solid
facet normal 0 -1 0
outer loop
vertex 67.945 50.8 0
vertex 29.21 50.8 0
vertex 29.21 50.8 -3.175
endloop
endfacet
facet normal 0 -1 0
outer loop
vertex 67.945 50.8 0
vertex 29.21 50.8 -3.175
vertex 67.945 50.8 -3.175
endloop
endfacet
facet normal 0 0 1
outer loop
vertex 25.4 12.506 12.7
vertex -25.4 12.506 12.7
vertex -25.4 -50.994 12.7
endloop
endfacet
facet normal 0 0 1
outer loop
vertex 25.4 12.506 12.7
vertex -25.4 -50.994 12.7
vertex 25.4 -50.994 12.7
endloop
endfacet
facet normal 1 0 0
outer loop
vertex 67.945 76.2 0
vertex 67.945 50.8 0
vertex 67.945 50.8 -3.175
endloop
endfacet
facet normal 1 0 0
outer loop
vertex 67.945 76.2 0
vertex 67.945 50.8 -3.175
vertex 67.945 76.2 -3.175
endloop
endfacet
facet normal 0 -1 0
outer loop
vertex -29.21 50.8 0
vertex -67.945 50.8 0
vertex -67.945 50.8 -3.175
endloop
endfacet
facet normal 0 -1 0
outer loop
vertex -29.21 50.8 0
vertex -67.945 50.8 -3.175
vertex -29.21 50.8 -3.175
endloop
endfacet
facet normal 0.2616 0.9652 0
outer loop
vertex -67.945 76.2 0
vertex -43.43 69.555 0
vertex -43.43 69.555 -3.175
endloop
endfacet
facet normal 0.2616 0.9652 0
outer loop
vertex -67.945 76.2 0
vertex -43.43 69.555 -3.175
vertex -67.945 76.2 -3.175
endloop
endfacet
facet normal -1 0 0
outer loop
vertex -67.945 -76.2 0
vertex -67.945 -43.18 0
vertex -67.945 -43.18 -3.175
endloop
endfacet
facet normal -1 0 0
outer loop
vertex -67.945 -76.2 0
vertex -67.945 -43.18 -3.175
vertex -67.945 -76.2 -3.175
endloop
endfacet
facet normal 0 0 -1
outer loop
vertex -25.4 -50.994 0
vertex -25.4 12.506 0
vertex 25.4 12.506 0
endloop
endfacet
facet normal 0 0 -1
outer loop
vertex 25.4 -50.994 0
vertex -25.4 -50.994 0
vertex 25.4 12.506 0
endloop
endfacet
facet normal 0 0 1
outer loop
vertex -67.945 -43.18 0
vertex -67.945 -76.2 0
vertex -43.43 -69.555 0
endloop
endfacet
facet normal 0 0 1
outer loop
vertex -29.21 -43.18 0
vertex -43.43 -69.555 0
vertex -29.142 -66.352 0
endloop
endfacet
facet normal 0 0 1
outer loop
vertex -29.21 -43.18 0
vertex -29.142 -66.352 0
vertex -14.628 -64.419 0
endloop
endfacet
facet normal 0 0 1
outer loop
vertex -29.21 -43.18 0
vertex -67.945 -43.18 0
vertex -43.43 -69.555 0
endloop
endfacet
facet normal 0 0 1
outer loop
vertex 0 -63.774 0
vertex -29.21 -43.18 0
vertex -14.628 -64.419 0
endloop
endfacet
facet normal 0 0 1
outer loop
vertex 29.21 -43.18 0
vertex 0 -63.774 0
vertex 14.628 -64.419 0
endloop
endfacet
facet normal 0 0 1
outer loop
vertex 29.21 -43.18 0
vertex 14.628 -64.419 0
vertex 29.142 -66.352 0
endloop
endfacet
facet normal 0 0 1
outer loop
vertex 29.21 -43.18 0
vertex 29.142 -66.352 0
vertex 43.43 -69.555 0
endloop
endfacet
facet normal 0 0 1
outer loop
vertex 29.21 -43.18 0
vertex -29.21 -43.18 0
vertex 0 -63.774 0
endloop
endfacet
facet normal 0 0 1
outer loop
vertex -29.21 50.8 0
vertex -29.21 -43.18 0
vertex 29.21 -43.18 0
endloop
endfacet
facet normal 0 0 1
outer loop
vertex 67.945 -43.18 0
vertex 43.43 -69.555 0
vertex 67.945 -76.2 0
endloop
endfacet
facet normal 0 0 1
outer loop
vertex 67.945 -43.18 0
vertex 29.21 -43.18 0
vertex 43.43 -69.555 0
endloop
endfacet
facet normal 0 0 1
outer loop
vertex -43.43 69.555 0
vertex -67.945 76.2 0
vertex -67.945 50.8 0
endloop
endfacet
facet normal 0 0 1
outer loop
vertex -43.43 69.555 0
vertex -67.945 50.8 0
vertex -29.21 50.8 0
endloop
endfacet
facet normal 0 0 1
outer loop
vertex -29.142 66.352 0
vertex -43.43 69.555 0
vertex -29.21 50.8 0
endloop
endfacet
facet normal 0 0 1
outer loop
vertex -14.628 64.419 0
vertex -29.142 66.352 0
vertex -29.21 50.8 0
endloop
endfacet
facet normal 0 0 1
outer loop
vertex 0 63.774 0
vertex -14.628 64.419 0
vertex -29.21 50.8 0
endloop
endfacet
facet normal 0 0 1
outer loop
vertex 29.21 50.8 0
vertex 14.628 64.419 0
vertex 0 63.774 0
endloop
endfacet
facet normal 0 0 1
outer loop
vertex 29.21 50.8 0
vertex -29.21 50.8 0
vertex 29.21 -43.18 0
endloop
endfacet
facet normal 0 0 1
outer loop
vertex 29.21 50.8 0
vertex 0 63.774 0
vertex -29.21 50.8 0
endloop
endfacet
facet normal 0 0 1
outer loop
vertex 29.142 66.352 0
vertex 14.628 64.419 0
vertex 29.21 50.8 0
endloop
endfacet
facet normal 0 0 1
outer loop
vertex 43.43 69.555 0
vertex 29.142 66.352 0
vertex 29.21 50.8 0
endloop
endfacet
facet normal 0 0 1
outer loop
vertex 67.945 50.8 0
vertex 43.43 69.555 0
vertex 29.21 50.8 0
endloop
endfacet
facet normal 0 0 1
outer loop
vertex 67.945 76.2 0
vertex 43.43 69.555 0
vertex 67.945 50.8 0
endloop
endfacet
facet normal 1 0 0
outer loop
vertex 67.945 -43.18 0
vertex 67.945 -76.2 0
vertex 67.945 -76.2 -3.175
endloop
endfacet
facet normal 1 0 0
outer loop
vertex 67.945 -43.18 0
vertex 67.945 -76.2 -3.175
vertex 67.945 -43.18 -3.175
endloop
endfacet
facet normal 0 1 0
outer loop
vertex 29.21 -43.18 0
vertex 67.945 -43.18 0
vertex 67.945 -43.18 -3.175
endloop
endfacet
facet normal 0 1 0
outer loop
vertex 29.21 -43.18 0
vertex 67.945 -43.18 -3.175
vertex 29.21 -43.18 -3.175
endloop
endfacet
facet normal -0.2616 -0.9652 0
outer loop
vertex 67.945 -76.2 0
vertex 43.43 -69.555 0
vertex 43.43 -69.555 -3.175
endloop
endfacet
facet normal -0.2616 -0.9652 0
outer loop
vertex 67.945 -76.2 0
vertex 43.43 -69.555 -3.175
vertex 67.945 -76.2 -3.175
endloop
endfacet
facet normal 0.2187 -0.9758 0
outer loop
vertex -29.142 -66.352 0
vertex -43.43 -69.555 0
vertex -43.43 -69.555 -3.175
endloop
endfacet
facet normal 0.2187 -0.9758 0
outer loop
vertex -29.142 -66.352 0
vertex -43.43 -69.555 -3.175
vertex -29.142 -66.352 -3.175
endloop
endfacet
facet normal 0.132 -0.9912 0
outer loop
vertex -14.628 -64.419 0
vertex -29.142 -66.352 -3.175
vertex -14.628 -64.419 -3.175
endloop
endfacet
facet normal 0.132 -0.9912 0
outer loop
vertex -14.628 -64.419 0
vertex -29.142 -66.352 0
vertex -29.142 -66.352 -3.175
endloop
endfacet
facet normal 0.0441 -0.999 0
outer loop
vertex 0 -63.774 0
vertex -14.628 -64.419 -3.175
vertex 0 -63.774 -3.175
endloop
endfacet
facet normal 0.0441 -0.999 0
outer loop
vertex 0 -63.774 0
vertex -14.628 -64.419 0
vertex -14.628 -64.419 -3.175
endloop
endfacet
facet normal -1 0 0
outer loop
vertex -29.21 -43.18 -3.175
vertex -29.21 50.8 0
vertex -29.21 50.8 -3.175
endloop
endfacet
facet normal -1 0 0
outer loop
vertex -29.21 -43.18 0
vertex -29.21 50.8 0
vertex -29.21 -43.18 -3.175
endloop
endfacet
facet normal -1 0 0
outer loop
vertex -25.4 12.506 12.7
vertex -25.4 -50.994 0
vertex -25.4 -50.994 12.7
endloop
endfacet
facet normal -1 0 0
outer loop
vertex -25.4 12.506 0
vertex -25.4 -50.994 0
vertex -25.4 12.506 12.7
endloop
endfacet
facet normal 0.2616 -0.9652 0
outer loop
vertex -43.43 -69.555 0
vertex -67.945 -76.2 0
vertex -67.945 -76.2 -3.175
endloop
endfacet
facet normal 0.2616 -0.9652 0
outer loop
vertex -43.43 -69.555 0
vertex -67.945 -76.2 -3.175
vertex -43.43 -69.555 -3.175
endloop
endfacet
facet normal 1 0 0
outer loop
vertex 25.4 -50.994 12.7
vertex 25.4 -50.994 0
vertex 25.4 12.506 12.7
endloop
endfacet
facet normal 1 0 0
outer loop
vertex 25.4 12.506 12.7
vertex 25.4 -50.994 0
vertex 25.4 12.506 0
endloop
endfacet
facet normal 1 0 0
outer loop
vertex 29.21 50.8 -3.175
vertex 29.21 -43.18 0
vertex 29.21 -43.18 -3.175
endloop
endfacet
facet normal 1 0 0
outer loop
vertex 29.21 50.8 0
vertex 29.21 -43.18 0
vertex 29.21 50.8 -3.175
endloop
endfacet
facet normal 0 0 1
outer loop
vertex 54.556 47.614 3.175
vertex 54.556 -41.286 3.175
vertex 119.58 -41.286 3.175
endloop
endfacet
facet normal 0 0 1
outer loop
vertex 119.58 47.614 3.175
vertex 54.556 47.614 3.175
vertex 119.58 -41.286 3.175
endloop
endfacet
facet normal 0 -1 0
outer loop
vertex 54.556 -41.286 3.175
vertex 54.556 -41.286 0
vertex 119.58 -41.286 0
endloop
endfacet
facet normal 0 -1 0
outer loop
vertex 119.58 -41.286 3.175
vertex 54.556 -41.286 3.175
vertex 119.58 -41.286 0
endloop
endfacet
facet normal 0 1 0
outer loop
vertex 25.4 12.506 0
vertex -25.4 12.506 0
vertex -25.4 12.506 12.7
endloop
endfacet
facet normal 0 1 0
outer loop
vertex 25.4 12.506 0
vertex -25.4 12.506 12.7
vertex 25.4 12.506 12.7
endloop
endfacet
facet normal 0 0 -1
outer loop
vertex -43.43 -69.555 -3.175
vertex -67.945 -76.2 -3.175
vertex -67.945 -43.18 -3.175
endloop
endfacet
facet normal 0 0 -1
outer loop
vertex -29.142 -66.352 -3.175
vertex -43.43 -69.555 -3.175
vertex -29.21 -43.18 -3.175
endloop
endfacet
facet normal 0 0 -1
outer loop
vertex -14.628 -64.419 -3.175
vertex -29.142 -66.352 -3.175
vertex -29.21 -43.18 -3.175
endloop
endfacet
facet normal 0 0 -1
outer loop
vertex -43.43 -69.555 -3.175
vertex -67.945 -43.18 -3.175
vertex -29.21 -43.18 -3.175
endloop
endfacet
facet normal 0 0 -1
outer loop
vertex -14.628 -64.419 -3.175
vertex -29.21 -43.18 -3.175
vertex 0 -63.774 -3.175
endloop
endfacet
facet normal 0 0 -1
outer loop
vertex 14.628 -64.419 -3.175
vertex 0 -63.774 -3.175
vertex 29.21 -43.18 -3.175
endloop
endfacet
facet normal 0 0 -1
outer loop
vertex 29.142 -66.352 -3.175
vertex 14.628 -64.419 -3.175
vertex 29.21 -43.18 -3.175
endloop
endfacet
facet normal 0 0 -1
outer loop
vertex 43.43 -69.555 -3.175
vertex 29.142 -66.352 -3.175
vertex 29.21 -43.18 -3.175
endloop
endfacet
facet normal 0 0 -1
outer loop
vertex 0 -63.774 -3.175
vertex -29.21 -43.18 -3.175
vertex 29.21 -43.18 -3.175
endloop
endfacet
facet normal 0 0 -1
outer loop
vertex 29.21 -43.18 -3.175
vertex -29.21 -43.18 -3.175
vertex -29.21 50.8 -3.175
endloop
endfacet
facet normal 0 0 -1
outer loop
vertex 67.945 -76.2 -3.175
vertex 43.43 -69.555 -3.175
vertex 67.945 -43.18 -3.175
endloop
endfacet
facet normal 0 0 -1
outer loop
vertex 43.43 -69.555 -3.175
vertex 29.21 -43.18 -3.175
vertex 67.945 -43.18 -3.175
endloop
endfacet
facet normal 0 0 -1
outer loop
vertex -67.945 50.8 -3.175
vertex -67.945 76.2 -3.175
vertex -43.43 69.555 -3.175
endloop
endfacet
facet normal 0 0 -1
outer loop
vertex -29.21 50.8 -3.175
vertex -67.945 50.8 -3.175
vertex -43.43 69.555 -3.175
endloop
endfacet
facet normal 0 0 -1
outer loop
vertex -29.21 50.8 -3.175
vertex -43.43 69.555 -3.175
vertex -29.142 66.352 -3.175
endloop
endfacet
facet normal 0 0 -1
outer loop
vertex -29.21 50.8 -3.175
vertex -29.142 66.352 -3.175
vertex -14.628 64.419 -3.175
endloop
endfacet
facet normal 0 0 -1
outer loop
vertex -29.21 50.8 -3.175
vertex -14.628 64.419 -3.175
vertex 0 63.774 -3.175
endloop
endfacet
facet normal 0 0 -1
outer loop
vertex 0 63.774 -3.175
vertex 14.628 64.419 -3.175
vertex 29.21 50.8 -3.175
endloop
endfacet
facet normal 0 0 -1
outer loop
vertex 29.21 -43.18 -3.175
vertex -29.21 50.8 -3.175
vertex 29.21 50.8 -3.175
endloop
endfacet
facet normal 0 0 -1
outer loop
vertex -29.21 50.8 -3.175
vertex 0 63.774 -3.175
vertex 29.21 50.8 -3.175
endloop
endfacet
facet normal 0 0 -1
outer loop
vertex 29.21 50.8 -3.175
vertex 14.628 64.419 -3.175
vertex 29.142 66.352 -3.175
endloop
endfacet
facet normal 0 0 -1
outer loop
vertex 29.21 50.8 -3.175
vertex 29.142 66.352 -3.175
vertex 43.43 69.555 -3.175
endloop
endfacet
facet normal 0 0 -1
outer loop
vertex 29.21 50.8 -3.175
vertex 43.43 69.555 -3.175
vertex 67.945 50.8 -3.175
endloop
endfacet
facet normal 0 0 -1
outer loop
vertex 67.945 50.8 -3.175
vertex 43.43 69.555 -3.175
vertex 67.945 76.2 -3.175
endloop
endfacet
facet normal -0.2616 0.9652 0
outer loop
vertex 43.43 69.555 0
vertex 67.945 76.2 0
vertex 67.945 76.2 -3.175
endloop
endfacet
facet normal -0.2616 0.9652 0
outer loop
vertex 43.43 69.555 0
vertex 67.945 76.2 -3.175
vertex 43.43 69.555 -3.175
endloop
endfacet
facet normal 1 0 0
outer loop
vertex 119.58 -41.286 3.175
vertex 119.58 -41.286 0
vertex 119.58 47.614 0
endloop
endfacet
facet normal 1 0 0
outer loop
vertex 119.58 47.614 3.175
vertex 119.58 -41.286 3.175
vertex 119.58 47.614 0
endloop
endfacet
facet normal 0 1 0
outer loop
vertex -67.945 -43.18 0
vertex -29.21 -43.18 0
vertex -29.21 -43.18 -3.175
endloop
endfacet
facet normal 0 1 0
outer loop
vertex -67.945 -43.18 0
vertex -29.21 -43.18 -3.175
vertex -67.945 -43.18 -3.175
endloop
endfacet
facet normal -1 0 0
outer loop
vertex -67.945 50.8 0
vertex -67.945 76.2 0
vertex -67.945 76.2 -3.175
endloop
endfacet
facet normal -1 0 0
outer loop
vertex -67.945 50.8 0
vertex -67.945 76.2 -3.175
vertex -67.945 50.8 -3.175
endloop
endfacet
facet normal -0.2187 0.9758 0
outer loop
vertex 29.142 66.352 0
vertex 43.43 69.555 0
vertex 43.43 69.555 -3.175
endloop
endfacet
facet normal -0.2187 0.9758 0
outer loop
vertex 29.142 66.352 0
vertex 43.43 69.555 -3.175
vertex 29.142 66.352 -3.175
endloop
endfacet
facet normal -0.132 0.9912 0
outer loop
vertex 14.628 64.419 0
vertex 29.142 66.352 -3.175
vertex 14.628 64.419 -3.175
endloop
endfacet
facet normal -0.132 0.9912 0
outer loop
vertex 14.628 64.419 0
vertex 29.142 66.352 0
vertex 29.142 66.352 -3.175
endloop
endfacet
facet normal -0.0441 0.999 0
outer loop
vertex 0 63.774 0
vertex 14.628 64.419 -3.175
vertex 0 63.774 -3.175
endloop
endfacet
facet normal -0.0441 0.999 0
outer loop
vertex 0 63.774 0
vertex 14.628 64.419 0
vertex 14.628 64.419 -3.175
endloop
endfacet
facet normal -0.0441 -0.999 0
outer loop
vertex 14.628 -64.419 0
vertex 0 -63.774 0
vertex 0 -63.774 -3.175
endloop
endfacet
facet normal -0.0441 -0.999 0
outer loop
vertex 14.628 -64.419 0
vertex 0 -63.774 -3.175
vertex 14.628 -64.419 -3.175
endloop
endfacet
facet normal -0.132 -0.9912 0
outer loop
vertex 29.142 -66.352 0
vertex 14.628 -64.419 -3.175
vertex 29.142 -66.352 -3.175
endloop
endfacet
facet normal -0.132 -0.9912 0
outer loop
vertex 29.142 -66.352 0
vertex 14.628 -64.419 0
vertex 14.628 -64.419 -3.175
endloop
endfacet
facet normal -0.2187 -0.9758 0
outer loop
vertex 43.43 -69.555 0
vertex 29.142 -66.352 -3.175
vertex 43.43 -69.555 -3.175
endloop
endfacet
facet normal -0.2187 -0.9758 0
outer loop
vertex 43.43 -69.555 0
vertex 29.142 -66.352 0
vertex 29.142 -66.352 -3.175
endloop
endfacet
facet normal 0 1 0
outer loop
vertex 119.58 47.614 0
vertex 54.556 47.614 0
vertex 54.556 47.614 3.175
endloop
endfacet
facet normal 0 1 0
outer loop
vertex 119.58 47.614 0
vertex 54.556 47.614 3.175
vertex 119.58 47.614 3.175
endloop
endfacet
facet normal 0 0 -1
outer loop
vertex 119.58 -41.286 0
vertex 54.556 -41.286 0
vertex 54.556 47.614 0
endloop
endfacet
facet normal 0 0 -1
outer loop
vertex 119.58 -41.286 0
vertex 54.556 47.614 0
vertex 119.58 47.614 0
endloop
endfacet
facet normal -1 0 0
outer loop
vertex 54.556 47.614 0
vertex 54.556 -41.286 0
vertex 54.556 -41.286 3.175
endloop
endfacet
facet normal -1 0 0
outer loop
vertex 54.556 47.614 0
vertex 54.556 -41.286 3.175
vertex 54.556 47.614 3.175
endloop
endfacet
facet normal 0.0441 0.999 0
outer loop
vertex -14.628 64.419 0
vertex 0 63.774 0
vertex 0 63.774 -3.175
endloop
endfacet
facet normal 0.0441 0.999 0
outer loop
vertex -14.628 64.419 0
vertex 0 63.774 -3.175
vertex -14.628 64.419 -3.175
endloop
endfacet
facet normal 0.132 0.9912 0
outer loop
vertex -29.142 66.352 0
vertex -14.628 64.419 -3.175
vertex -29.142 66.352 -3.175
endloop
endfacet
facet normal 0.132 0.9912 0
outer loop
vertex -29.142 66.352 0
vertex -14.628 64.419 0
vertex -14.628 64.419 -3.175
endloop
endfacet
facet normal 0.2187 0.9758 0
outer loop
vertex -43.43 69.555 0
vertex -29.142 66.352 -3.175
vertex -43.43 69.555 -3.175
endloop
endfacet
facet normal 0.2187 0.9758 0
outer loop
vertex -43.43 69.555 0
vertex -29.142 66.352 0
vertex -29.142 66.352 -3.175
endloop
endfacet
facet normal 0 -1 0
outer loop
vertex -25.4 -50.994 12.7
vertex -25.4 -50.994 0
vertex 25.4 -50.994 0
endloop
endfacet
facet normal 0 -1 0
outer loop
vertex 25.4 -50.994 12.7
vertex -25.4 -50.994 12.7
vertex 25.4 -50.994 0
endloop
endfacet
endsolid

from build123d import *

# Parameters (mm, degrees)
F1_DEPTH = 3.175
F2_W     = 50.8
F2_H     = 63.5
F3_DEPTH = 12.7
F4_W     = 65.024
F4_H     = 88.9
F5_DEPTH = 3.175


with BuildPart() as f1:
    # F0 (on Top) → F1 (new body)
    with BuildSketch(Plane.XY):
        with BuildLine():
            Line((29.21, 0), (-29.21, 0))
            Line((-29.21, 0), (-29.21, -43.18))
            Line((-29.21, -43.18), (-67.945, -43.18))
            Line((-67.945, -43.18), (-67.945, -76.2))
            Line((-67.945, -76.2), (-43.42958, -69.55514))
            ThreePointArc((-43.42958, -69.55514), (-21.906355, -65.225401), (0, -63.773691))
            ThreePointArc((0, -63.773691), (21.906355, -65.225401), (43.42958, -69.55514))
            Line((43.42958, -69.55514), (67.945, -76.2))
            Line((67.945, -76.2), (67.945, -43.18))
            Line((67.945, -43.18), (29.21, -43.18))
            Line((29.21, -43.18), (29.21, 0))
        make_face()
        with BuildLine():
            Line((-43.42958, 69.55514), (-67.945, 76.2))
            Line((-67.945, 76.2), (-67.945, 50.8))
            Line((-67.945, 50.8), (-29.21, 50.8))
            Line((-29.21, 50.8), (-29.21, 40.64))
            Line((-29.21, 40.64), (-29.21, 17.145))
            Line((-29.21, 17.145), (-29.21, 0))
            Line((-29.21, 0), (29.21, 0))
            Line((29.21, 0), (29.21, 17.145))
            Line((29.21, 17.145), (29.21, 40.64))
            Line((29.21, 40.64), (29.21, 50.8))
            Line((29.21, 50.8), (67.945, 50.8))
            Line((67.945, 50.8), (67.945, 76.2))
            Line((67.945, 76.2), (43.42958, 69.55514))
            ThreePointArc((43.42958, 69.55514), (21.906355, 65.225401), (0, 63.773691))
            ThreePointArc((0, 63.773691), (-21.906355, 65.225401), (-43.42958, 69.55514))
        make_face()
    extrude(amount=-F1_DEPTH)


with BuildPart() as f3:
    # F2 (on face) → F3 (new body)
    with BuildSketch(Plane.XY):
        with Locations((0, -19.244497)):
            Rectangle(F2_W, F2_H)
    extrude(amount=F3_DEPTH)


with BuildPart() as f5:
    # F4 (on Top) → F5 (new body)
    with BuildSketch(Plane.XY):
        with Locations((87.067511, 3.163923)):
            Rectangle(F4_W, F4_H)
    extrude(amount=F5_DEPTH)


solid = Compound([f1.part, f3.part, f5.part])
